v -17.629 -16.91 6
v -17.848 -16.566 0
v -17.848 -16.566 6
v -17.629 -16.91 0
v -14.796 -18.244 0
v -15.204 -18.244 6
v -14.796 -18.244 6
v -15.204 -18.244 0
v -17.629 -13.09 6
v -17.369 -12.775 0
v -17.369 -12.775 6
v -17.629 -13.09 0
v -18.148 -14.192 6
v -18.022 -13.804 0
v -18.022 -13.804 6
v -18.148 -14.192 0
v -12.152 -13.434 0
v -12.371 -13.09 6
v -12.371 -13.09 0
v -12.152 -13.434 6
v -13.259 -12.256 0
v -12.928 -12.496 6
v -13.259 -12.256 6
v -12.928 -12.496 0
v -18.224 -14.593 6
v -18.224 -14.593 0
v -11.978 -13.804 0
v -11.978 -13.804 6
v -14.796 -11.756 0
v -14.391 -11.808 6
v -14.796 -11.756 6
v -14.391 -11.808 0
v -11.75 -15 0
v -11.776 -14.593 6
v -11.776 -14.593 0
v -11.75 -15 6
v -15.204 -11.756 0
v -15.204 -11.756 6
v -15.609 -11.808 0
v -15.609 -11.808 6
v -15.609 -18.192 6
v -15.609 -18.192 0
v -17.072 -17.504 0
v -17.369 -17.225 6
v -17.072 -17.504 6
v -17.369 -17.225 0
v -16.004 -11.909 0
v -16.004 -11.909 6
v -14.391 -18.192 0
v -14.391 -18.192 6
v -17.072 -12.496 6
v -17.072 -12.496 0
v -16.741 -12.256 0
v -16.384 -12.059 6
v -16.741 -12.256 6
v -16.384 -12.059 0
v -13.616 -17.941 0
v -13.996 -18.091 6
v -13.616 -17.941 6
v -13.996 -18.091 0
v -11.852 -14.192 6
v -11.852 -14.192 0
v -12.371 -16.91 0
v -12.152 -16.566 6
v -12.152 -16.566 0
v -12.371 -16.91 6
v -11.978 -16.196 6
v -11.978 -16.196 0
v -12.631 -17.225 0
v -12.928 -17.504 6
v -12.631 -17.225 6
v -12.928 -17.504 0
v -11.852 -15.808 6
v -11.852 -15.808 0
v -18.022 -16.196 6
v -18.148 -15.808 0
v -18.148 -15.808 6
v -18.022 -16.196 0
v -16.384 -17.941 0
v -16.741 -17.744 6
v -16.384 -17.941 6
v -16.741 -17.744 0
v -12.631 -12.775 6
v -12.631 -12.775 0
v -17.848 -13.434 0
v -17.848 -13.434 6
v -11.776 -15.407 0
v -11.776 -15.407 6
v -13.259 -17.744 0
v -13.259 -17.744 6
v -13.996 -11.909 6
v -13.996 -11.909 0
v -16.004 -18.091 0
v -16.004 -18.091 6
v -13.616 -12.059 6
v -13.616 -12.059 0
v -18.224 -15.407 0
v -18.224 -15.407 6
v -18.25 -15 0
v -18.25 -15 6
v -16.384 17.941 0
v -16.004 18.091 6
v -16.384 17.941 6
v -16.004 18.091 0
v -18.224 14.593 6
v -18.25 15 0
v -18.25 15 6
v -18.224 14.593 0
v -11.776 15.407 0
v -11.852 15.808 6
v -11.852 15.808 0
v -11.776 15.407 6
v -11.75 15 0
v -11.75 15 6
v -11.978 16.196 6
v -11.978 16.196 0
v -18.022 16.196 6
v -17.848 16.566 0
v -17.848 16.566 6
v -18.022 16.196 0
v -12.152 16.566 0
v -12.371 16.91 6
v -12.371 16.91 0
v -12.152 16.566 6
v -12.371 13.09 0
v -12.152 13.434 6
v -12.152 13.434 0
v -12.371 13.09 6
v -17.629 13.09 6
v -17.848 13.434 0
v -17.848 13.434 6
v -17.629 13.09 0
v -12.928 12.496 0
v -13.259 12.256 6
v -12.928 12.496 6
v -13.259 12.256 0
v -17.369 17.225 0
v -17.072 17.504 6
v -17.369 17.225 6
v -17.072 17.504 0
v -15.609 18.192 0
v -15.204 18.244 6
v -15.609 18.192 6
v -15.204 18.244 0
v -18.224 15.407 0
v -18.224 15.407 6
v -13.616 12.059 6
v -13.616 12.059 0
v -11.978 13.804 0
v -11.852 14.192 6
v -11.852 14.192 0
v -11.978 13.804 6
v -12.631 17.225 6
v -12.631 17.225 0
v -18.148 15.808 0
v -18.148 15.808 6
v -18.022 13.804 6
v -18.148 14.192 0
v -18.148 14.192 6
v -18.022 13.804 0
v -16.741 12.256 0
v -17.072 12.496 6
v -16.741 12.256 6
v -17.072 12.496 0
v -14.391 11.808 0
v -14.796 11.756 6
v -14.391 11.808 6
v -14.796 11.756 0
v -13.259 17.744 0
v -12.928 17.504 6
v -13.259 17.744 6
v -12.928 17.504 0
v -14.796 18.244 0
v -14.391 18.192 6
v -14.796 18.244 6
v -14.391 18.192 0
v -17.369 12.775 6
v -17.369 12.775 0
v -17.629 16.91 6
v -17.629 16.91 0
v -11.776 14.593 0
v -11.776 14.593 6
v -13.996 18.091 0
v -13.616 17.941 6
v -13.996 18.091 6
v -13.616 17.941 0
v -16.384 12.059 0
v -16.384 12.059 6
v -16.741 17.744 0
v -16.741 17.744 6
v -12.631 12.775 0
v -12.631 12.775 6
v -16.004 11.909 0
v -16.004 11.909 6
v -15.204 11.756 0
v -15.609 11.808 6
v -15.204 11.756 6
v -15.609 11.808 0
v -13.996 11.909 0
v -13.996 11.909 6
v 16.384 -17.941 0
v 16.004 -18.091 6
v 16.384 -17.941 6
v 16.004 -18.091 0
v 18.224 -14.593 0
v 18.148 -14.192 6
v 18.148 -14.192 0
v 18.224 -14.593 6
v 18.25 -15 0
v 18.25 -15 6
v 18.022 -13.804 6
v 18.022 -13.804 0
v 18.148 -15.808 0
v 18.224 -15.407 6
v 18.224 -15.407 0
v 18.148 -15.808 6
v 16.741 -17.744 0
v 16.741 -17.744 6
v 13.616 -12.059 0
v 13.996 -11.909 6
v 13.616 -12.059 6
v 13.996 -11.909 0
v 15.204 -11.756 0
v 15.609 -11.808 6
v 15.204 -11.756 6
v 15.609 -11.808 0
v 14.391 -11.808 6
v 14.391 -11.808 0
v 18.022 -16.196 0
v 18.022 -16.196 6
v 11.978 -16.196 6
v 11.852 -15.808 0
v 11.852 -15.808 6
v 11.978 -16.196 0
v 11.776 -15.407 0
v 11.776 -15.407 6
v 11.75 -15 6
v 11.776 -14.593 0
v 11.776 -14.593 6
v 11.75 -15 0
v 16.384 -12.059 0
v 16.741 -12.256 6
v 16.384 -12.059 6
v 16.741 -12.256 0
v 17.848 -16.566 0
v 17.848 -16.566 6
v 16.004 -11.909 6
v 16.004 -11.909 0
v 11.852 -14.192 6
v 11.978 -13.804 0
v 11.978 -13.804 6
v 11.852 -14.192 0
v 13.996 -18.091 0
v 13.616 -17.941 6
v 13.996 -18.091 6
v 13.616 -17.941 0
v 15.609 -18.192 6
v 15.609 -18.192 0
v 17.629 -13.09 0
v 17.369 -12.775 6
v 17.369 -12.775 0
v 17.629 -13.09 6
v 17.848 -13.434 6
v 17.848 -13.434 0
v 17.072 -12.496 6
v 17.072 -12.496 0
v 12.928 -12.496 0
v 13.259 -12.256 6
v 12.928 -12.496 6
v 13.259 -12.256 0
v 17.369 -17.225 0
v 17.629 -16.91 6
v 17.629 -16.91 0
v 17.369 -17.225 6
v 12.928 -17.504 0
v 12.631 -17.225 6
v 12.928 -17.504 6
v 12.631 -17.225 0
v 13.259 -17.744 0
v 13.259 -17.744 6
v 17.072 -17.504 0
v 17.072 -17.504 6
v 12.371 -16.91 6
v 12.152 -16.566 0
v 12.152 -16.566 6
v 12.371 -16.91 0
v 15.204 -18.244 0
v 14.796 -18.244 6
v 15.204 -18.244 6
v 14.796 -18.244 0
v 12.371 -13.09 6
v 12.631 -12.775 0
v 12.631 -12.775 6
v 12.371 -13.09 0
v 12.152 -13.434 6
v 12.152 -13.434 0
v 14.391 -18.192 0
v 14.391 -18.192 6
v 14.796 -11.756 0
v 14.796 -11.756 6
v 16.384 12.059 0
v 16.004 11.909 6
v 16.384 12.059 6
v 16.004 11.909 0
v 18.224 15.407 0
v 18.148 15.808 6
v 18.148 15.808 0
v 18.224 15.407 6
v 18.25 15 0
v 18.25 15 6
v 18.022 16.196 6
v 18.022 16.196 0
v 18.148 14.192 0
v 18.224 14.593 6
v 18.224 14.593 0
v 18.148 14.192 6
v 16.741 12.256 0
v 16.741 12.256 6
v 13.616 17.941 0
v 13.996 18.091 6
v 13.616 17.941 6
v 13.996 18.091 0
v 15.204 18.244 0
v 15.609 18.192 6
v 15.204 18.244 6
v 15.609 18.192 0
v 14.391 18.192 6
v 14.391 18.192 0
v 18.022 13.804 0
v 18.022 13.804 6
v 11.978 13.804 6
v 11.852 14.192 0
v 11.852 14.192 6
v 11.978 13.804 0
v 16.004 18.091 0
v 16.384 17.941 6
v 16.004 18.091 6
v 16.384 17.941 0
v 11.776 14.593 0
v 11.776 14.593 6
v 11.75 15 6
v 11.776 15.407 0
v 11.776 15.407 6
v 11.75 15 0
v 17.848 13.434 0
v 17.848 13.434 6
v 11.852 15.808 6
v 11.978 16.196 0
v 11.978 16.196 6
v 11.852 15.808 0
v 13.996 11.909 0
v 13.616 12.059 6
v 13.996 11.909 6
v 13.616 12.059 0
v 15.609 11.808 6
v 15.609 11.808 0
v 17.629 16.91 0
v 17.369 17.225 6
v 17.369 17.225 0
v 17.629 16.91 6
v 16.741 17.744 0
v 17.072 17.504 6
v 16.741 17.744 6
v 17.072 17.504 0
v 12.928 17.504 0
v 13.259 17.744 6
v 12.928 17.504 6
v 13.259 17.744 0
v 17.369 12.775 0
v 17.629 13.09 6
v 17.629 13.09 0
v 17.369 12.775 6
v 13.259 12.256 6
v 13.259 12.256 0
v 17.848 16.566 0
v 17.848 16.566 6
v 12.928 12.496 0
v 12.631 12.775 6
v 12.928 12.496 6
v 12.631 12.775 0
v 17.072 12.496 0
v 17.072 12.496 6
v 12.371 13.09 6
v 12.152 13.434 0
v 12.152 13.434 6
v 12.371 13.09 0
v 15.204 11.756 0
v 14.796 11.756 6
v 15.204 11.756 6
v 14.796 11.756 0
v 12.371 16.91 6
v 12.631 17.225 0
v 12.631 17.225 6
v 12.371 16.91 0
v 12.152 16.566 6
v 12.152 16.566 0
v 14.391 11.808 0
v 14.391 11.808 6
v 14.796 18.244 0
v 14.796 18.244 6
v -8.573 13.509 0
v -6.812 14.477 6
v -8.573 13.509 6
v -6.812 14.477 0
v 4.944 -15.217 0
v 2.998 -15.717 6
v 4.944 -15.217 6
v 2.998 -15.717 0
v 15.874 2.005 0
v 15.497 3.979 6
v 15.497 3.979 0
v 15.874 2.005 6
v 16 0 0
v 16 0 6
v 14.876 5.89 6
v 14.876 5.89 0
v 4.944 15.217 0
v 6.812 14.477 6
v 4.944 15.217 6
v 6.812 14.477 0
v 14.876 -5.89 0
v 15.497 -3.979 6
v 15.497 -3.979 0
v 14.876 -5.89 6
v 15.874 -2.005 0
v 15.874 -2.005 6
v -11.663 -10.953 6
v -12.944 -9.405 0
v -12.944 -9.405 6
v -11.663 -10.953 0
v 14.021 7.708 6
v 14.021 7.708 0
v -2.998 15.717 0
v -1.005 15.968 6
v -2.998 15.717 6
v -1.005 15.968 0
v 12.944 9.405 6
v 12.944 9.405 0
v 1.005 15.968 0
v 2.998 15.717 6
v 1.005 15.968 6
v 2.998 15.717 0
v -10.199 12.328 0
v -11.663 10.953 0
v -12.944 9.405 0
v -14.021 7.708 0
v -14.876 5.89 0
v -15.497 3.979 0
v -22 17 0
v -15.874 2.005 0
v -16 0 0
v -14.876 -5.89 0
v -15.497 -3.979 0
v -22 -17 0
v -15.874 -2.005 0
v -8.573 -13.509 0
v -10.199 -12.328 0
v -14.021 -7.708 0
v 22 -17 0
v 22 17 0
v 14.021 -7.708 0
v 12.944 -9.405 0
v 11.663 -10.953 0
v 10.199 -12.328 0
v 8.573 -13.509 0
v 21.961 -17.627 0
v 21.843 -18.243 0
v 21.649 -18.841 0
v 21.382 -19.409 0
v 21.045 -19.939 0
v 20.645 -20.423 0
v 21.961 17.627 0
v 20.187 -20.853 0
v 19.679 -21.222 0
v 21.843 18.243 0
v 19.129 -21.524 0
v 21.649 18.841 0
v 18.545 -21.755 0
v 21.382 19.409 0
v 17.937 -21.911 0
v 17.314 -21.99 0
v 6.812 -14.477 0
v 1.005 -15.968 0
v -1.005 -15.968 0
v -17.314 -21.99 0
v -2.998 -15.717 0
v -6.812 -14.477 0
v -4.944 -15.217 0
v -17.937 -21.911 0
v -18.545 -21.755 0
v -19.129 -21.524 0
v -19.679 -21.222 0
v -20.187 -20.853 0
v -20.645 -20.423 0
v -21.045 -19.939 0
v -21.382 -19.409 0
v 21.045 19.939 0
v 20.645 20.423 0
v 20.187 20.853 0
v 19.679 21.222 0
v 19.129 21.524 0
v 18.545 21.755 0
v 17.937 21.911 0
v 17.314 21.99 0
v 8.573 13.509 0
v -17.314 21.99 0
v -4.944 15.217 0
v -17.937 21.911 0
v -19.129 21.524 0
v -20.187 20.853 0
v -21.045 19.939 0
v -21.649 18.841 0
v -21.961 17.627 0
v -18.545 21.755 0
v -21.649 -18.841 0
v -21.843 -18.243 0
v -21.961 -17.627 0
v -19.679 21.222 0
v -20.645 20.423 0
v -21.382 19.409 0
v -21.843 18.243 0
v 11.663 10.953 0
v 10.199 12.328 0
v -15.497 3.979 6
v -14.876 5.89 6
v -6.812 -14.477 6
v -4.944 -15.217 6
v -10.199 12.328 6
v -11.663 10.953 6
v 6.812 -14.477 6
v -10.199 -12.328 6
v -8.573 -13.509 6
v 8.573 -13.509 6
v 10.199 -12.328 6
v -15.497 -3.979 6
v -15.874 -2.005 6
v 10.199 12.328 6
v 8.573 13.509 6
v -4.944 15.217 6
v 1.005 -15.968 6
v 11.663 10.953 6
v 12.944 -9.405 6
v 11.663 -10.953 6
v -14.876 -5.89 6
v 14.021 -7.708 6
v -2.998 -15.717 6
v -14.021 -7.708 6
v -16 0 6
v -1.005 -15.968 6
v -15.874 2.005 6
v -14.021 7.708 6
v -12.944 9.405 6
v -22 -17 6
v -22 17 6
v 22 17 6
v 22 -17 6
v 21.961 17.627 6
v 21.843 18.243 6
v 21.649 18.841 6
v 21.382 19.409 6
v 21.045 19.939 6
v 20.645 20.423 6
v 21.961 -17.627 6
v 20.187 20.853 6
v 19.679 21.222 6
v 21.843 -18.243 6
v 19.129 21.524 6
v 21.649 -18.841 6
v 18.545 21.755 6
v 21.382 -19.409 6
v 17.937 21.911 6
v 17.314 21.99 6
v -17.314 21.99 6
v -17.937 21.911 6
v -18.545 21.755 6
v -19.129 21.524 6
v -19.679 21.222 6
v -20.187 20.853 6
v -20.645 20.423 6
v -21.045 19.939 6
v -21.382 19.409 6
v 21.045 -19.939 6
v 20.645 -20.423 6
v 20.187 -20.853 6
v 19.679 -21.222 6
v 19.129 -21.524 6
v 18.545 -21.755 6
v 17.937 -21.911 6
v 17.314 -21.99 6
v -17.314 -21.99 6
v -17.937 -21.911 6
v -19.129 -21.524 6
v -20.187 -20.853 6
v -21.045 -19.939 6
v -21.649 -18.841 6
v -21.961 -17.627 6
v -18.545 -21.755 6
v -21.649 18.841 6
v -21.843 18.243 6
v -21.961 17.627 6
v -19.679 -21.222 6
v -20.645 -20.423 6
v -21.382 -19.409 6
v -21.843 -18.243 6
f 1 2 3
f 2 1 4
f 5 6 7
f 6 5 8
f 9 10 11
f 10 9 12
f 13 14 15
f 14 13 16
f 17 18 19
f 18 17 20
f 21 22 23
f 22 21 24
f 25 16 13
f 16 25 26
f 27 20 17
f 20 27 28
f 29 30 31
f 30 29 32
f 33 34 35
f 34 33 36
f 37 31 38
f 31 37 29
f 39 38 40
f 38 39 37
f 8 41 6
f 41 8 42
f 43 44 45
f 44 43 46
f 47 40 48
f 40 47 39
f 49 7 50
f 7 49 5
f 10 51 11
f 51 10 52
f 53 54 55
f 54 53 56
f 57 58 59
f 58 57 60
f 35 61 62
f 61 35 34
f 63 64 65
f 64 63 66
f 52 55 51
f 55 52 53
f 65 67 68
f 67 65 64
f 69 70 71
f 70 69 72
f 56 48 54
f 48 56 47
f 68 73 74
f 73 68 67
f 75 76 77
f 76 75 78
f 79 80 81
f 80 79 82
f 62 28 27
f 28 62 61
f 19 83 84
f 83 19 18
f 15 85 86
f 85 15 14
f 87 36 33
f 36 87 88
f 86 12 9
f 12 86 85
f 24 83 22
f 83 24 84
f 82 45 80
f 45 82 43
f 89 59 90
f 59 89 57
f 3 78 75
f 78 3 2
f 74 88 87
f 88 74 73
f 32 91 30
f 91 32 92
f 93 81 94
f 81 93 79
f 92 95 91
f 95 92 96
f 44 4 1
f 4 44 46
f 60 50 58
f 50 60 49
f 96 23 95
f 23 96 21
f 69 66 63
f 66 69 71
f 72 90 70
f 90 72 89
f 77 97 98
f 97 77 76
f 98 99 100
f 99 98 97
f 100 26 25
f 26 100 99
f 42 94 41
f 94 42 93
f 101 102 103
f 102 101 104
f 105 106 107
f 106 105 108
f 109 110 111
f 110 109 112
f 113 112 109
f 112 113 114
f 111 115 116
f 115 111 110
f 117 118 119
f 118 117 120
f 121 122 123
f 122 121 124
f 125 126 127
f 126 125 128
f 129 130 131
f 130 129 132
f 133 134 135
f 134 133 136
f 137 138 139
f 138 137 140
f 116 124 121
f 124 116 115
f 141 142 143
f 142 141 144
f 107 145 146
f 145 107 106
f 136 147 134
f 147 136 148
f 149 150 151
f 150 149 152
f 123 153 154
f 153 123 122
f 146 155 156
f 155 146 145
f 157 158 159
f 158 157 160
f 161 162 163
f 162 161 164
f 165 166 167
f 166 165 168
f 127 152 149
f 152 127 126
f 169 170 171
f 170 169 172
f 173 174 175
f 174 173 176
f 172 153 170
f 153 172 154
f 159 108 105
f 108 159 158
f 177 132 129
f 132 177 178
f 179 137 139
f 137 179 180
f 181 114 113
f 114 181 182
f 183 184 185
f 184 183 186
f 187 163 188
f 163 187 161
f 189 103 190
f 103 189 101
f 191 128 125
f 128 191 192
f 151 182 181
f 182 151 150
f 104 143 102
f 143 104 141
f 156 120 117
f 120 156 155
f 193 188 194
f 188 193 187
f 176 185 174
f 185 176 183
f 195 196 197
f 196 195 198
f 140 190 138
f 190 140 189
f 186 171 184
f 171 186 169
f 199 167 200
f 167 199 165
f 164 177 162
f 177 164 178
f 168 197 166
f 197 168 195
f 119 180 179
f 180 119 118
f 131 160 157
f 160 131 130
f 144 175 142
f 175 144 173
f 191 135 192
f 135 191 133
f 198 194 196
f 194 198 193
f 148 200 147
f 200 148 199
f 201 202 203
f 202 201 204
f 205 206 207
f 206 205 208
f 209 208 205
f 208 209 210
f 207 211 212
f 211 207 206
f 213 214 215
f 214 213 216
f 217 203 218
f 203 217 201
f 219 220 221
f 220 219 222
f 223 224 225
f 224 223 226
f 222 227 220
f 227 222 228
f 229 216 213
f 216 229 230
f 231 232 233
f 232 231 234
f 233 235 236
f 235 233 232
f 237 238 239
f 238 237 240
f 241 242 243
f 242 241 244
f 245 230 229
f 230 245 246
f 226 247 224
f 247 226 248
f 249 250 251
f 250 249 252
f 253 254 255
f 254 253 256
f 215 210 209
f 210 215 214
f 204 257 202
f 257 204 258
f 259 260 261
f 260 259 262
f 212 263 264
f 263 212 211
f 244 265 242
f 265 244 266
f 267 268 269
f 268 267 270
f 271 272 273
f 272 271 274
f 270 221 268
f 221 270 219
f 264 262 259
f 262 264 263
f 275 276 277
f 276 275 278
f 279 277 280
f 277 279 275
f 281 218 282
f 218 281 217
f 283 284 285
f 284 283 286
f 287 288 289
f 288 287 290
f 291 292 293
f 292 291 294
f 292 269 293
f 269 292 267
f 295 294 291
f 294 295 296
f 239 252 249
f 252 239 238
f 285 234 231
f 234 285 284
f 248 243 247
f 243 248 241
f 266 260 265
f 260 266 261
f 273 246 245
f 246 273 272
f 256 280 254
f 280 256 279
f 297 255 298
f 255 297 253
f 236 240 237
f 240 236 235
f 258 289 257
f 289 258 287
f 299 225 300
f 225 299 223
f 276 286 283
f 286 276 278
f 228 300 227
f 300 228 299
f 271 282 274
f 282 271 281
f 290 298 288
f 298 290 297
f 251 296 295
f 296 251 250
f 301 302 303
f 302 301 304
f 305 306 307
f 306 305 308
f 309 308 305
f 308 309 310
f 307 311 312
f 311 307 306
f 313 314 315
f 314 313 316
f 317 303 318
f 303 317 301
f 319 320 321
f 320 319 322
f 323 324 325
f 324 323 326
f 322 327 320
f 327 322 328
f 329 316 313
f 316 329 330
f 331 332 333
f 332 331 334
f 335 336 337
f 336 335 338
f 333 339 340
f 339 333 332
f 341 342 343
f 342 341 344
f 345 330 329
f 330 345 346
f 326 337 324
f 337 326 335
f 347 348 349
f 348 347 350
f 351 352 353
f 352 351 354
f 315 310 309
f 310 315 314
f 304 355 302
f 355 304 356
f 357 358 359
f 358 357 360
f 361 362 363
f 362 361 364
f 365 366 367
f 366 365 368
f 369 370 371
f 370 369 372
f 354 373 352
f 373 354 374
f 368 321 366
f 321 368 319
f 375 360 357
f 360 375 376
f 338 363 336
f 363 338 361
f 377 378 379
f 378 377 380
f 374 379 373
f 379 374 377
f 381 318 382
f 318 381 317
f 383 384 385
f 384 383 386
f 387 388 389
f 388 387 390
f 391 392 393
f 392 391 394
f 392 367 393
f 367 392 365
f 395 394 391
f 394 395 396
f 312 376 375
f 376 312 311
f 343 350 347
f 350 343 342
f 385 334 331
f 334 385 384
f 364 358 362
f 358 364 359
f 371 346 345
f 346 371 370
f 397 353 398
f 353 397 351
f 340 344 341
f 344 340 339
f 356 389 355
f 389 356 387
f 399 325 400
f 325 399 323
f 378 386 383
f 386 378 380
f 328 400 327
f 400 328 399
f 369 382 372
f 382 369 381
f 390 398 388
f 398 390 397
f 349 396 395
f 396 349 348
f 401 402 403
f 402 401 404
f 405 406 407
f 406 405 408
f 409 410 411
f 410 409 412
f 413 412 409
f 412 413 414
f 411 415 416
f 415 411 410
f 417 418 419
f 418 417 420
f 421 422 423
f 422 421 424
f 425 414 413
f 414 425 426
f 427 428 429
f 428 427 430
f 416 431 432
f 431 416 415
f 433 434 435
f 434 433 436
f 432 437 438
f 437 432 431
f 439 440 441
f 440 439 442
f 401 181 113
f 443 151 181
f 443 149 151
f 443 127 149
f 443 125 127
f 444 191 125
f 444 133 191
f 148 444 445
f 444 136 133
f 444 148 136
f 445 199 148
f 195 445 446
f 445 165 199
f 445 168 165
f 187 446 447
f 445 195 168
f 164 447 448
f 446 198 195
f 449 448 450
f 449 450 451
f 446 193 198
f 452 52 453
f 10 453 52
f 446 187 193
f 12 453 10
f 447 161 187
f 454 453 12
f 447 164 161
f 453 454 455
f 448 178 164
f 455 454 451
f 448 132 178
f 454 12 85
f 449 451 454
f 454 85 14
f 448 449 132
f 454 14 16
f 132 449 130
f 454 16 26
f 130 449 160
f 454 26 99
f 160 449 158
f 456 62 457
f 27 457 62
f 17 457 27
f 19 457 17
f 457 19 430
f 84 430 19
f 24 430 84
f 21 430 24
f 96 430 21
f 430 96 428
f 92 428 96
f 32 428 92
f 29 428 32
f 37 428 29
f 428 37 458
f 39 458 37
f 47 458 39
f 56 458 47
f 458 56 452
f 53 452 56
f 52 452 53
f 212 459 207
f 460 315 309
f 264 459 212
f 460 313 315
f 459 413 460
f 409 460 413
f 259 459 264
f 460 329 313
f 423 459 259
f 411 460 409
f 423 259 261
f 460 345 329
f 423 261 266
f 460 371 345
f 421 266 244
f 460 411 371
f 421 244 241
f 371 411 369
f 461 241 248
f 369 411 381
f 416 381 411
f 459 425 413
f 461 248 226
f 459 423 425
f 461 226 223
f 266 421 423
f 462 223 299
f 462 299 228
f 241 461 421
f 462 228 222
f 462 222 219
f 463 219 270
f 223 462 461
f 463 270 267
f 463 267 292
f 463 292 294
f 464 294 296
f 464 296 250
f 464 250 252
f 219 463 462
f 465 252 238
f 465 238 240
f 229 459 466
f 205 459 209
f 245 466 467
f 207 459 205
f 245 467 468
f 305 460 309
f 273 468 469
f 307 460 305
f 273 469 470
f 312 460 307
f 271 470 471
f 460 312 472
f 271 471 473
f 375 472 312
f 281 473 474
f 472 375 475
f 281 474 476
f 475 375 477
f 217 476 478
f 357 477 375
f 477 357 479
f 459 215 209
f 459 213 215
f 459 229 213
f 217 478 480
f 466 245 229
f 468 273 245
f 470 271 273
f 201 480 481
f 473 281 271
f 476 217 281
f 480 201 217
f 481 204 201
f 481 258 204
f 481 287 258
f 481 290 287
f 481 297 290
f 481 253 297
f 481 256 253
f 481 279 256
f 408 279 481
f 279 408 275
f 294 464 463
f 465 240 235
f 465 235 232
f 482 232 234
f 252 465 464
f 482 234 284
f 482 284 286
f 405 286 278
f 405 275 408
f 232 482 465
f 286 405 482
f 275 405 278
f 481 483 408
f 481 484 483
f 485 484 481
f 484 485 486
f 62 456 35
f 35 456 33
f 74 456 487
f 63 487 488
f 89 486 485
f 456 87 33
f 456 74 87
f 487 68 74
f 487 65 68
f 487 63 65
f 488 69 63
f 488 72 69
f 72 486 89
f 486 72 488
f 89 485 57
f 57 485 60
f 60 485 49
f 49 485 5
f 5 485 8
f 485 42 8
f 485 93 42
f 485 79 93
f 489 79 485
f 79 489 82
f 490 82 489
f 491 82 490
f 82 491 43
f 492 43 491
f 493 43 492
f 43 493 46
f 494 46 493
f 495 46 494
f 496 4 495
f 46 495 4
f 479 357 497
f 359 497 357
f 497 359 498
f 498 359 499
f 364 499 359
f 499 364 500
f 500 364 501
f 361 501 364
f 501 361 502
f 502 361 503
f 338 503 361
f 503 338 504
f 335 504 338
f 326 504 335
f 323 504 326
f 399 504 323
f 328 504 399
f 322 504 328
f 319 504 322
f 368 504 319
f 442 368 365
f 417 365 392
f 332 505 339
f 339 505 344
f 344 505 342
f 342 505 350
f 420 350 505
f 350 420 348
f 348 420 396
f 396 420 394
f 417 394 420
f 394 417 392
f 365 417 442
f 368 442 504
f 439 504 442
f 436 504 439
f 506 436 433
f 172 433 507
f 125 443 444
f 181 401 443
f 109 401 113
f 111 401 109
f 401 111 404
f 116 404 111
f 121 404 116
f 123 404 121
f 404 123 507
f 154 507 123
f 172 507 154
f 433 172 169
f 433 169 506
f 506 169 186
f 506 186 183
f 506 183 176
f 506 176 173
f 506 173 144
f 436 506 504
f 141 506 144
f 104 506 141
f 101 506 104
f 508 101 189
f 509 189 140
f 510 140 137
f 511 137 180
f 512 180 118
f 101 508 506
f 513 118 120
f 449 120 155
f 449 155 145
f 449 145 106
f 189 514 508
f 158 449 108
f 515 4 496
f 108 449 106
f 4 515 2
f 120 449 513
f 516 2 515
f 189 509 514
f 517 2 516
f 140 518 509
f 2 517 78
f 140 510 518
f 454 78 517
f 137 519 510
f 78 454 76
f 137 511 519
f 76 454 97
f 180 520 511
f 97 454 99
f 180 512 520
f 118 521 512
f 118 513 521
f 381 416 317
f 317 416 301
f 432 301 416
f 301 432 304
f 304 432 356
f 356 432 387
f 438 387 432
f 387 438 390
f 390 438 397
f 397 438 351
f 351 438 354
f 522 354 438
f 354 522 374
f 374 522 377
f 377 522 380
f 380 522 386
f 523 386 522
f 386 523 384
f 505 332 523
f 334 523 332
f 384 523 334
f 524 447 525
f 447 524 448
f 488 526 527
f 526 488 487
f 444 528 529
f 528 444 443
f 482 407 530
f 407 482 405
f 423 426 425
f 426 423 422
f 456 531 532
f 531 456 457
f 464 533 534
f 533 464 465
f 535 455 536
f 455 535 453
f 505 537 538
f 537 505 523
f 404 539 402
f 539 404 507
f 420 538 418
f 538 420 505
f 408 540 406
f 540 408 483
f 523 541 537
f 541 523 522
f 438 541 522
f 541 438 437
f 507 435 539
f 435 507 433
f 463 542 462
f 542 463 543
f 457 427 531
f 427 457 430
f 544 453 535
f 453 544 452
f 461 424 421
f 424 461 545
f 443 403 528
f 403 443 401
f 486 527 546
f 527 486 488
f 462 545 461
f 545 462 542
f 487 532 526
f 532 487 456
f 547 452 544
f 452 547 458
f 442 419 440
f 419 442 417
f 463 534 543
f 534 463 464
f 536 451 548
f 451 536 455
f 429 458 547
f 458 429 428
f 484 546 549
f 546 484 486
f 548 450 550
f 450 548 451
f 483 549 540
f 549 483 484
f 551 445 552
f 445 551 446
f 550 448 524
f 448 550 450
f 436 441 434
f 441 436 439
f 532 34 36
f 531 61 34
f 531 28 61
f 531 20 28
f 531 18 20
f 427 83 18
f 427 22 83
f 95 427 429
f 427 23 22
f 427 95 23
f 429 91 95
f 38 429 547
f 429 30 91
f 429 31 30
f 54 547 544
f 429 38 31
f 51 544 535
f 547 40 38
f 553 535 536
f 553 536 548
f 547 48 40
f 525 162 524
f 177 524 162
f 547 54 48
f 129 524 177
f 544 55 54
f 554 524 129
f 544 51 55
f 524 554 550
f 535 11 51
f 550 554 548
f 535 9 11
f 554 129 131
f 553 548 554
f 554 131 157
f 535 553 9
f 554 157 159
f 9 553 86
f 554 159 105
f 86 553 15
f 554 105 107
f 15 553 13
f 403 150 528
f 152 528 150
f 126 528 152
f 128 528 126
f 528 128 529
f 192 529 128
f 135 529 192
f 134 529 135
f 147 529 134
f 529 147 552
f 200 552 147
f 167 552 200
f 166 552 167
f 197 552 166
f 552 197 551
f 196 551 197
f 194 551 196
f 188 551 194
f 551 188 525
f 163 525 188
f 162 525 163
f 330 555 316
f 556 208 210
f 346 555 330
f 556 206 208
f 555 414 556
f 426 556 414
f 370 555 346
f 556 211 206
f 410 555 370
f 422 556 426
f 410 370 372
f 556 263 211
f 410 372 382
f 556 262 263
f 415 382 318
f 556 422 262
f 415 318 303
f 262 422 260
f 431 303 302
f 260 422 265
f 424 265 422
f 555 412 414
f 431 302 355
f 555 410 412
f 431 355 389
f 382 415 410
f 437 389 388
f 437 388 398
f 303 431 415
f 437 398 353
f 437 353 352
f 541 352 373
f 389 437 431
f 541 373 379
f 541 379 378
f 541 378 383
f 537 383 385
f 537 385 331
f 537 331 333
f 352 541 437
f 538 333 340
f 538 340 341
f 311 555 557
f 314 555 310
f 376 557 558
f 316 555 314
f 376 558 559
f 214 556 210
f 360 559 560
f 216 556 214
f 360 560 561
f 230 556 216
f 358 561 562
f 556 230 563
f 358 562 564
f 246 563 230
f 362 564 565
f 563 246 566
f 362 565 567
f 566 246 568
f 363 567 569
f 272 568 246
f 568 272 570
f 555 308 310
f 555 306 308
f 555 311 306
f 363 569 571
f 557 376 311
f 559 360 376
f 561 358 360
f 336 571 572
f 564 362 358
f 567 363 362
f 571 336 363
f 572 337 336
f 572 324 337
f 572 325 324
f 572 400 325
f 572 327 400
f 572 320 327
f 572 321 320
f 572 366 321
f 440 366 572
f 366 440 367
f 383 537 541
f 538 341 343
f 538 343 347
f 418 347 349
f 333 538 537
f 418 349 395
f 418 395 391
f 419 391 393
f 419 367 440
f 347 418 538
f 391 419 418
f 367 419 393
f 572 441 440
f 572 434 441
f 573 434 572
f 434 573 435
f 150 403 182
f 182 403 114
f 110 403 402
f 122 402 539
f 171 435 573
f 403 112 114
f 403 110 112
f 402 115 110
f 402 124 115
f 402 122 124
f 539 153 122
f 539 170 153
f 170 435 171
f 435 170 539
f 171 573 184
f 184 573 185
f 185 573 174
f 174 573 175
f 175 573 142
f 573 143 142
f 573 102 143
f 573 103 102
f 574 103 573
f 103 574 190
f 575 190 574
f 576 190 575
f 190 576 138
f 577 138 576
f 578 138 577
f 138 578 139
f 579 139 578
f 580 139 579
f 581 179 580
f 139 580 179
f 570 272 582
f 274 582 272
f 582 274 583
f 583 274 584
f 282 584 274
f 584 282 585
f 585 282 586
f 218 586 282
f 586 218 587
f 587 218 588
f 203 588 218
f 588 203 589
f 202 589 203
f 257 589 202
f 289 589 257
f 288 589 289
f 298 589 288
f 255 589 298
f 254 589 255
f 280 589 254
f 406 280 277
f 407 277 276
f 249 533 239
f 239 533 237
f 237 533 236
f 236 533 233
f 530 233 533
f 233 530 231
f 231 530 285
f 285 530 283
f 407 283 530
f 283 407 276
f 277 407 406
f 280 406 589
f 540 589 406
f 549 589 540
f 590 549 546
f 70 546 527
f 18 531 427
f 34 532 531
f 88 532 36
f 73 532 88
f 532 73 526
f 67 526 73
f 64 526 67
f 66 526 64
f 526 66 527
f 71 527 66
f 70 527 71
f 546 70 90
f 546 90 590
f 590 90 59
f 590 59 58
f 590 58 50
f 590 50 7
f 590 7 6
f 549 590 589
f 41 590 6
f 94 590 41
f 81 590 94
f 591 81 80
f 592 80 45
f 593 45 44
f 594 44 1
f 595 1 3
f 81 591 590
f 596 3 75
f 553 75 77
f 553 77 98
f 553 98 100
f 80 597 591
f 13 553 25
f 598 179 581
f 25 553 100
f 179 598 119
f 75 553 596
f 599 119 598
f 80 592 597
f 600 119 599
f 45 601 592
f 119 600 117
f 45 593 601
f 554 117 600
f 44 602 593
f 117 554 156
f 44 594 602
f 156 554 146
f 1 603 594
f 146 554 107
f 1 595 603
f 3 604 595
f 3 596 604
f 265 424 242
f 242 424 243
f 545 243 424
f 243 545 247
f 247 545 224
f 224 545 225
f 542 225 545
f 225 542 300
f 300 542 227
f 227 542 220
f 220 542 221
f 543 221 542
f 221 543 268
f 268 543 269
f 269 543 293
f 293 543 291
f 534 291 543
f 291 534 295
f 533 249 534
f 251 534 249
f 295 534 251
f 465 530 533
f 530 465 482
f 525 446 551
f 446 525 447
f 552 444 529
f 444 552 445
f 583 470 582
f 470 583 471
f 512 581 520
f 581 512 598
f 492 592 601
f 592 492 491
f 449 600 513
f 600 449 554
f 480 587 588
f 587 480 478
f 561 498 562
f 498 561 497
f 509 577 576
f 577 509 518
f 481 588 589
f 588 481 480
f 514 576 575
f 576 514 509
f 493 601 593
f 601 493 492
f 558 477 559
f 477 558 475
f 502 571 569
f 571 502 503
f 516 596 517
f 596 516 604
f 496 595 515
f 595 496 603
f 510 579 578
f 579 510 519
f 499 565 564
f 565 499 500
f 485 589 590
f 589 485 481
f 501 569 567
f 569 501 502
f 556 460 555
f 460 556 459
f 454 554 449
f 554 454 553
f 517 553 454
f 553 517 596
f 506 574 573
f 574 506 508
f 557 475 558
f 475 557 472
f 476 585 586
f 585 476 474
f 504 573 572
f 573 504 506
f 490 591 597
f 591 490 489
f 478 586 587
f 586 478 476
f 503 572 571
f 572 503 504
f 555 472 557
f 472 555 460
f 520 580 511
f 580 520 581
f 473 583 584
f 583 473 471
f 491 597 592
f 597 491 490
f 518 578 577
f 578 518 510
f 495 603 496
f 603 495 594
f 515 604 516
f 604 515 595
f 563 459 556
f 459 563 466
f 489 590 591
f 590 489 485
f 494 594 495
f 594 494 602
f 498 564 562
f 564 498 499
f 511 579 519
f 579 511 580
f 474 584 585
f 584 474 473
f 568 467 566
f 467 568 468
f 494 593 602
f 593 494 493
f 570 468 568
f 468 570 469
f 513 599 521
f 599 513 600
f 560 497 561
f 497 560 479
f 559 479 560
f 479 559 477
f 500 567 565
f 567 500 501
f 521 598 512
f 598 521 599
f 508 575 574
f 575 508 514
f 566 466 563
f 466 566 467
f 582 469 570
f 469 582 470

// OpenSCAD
$fn = 50;


difference() {
	union() {
		hull() {
			translate(v = [-17.0000000000, 17.0000000000, 0]) {
				cylinder(h = 6, r = 5);
			}
			translate(v = [17.0000000000, 17.0000000000, 0]) {
				cylinder(h = 6, r = 5);
			}
			translate(v = [-17.0000000000, -17.0000000000, 0]) {
				cylinder(h = 6, r = 5);
			}
			translate(v = [17.0000000000, -17.0000000000, 0]) {
				cylinder(h = 6, r = 5);
			}
		}
	}
	union() {
		#translate(v = [-15.0000000000, -15.0000000000, -100.0000000000]) {
			cylinder(h = 200, r = 3.2500000000);
		}
		#translate(v = [-15.0000000000, 15.0000000000, -100.0000000000]) {
			cylinder(h = 200, r = 3.2500000000);
		}
		#translate(v = [15.0000000000, -15.0000000000, -100.0000000000]) {
			cylinder(h = 200, r = 3.2500000000);
		}
		#translate(v = [15.0000000000, 15.0000000000, -100.0000000000]) {
			cylinder(h = 200, r = 3.2500000000);
		}
		#cylinder(h = 6, r = 16.0000000000);
	}
}
